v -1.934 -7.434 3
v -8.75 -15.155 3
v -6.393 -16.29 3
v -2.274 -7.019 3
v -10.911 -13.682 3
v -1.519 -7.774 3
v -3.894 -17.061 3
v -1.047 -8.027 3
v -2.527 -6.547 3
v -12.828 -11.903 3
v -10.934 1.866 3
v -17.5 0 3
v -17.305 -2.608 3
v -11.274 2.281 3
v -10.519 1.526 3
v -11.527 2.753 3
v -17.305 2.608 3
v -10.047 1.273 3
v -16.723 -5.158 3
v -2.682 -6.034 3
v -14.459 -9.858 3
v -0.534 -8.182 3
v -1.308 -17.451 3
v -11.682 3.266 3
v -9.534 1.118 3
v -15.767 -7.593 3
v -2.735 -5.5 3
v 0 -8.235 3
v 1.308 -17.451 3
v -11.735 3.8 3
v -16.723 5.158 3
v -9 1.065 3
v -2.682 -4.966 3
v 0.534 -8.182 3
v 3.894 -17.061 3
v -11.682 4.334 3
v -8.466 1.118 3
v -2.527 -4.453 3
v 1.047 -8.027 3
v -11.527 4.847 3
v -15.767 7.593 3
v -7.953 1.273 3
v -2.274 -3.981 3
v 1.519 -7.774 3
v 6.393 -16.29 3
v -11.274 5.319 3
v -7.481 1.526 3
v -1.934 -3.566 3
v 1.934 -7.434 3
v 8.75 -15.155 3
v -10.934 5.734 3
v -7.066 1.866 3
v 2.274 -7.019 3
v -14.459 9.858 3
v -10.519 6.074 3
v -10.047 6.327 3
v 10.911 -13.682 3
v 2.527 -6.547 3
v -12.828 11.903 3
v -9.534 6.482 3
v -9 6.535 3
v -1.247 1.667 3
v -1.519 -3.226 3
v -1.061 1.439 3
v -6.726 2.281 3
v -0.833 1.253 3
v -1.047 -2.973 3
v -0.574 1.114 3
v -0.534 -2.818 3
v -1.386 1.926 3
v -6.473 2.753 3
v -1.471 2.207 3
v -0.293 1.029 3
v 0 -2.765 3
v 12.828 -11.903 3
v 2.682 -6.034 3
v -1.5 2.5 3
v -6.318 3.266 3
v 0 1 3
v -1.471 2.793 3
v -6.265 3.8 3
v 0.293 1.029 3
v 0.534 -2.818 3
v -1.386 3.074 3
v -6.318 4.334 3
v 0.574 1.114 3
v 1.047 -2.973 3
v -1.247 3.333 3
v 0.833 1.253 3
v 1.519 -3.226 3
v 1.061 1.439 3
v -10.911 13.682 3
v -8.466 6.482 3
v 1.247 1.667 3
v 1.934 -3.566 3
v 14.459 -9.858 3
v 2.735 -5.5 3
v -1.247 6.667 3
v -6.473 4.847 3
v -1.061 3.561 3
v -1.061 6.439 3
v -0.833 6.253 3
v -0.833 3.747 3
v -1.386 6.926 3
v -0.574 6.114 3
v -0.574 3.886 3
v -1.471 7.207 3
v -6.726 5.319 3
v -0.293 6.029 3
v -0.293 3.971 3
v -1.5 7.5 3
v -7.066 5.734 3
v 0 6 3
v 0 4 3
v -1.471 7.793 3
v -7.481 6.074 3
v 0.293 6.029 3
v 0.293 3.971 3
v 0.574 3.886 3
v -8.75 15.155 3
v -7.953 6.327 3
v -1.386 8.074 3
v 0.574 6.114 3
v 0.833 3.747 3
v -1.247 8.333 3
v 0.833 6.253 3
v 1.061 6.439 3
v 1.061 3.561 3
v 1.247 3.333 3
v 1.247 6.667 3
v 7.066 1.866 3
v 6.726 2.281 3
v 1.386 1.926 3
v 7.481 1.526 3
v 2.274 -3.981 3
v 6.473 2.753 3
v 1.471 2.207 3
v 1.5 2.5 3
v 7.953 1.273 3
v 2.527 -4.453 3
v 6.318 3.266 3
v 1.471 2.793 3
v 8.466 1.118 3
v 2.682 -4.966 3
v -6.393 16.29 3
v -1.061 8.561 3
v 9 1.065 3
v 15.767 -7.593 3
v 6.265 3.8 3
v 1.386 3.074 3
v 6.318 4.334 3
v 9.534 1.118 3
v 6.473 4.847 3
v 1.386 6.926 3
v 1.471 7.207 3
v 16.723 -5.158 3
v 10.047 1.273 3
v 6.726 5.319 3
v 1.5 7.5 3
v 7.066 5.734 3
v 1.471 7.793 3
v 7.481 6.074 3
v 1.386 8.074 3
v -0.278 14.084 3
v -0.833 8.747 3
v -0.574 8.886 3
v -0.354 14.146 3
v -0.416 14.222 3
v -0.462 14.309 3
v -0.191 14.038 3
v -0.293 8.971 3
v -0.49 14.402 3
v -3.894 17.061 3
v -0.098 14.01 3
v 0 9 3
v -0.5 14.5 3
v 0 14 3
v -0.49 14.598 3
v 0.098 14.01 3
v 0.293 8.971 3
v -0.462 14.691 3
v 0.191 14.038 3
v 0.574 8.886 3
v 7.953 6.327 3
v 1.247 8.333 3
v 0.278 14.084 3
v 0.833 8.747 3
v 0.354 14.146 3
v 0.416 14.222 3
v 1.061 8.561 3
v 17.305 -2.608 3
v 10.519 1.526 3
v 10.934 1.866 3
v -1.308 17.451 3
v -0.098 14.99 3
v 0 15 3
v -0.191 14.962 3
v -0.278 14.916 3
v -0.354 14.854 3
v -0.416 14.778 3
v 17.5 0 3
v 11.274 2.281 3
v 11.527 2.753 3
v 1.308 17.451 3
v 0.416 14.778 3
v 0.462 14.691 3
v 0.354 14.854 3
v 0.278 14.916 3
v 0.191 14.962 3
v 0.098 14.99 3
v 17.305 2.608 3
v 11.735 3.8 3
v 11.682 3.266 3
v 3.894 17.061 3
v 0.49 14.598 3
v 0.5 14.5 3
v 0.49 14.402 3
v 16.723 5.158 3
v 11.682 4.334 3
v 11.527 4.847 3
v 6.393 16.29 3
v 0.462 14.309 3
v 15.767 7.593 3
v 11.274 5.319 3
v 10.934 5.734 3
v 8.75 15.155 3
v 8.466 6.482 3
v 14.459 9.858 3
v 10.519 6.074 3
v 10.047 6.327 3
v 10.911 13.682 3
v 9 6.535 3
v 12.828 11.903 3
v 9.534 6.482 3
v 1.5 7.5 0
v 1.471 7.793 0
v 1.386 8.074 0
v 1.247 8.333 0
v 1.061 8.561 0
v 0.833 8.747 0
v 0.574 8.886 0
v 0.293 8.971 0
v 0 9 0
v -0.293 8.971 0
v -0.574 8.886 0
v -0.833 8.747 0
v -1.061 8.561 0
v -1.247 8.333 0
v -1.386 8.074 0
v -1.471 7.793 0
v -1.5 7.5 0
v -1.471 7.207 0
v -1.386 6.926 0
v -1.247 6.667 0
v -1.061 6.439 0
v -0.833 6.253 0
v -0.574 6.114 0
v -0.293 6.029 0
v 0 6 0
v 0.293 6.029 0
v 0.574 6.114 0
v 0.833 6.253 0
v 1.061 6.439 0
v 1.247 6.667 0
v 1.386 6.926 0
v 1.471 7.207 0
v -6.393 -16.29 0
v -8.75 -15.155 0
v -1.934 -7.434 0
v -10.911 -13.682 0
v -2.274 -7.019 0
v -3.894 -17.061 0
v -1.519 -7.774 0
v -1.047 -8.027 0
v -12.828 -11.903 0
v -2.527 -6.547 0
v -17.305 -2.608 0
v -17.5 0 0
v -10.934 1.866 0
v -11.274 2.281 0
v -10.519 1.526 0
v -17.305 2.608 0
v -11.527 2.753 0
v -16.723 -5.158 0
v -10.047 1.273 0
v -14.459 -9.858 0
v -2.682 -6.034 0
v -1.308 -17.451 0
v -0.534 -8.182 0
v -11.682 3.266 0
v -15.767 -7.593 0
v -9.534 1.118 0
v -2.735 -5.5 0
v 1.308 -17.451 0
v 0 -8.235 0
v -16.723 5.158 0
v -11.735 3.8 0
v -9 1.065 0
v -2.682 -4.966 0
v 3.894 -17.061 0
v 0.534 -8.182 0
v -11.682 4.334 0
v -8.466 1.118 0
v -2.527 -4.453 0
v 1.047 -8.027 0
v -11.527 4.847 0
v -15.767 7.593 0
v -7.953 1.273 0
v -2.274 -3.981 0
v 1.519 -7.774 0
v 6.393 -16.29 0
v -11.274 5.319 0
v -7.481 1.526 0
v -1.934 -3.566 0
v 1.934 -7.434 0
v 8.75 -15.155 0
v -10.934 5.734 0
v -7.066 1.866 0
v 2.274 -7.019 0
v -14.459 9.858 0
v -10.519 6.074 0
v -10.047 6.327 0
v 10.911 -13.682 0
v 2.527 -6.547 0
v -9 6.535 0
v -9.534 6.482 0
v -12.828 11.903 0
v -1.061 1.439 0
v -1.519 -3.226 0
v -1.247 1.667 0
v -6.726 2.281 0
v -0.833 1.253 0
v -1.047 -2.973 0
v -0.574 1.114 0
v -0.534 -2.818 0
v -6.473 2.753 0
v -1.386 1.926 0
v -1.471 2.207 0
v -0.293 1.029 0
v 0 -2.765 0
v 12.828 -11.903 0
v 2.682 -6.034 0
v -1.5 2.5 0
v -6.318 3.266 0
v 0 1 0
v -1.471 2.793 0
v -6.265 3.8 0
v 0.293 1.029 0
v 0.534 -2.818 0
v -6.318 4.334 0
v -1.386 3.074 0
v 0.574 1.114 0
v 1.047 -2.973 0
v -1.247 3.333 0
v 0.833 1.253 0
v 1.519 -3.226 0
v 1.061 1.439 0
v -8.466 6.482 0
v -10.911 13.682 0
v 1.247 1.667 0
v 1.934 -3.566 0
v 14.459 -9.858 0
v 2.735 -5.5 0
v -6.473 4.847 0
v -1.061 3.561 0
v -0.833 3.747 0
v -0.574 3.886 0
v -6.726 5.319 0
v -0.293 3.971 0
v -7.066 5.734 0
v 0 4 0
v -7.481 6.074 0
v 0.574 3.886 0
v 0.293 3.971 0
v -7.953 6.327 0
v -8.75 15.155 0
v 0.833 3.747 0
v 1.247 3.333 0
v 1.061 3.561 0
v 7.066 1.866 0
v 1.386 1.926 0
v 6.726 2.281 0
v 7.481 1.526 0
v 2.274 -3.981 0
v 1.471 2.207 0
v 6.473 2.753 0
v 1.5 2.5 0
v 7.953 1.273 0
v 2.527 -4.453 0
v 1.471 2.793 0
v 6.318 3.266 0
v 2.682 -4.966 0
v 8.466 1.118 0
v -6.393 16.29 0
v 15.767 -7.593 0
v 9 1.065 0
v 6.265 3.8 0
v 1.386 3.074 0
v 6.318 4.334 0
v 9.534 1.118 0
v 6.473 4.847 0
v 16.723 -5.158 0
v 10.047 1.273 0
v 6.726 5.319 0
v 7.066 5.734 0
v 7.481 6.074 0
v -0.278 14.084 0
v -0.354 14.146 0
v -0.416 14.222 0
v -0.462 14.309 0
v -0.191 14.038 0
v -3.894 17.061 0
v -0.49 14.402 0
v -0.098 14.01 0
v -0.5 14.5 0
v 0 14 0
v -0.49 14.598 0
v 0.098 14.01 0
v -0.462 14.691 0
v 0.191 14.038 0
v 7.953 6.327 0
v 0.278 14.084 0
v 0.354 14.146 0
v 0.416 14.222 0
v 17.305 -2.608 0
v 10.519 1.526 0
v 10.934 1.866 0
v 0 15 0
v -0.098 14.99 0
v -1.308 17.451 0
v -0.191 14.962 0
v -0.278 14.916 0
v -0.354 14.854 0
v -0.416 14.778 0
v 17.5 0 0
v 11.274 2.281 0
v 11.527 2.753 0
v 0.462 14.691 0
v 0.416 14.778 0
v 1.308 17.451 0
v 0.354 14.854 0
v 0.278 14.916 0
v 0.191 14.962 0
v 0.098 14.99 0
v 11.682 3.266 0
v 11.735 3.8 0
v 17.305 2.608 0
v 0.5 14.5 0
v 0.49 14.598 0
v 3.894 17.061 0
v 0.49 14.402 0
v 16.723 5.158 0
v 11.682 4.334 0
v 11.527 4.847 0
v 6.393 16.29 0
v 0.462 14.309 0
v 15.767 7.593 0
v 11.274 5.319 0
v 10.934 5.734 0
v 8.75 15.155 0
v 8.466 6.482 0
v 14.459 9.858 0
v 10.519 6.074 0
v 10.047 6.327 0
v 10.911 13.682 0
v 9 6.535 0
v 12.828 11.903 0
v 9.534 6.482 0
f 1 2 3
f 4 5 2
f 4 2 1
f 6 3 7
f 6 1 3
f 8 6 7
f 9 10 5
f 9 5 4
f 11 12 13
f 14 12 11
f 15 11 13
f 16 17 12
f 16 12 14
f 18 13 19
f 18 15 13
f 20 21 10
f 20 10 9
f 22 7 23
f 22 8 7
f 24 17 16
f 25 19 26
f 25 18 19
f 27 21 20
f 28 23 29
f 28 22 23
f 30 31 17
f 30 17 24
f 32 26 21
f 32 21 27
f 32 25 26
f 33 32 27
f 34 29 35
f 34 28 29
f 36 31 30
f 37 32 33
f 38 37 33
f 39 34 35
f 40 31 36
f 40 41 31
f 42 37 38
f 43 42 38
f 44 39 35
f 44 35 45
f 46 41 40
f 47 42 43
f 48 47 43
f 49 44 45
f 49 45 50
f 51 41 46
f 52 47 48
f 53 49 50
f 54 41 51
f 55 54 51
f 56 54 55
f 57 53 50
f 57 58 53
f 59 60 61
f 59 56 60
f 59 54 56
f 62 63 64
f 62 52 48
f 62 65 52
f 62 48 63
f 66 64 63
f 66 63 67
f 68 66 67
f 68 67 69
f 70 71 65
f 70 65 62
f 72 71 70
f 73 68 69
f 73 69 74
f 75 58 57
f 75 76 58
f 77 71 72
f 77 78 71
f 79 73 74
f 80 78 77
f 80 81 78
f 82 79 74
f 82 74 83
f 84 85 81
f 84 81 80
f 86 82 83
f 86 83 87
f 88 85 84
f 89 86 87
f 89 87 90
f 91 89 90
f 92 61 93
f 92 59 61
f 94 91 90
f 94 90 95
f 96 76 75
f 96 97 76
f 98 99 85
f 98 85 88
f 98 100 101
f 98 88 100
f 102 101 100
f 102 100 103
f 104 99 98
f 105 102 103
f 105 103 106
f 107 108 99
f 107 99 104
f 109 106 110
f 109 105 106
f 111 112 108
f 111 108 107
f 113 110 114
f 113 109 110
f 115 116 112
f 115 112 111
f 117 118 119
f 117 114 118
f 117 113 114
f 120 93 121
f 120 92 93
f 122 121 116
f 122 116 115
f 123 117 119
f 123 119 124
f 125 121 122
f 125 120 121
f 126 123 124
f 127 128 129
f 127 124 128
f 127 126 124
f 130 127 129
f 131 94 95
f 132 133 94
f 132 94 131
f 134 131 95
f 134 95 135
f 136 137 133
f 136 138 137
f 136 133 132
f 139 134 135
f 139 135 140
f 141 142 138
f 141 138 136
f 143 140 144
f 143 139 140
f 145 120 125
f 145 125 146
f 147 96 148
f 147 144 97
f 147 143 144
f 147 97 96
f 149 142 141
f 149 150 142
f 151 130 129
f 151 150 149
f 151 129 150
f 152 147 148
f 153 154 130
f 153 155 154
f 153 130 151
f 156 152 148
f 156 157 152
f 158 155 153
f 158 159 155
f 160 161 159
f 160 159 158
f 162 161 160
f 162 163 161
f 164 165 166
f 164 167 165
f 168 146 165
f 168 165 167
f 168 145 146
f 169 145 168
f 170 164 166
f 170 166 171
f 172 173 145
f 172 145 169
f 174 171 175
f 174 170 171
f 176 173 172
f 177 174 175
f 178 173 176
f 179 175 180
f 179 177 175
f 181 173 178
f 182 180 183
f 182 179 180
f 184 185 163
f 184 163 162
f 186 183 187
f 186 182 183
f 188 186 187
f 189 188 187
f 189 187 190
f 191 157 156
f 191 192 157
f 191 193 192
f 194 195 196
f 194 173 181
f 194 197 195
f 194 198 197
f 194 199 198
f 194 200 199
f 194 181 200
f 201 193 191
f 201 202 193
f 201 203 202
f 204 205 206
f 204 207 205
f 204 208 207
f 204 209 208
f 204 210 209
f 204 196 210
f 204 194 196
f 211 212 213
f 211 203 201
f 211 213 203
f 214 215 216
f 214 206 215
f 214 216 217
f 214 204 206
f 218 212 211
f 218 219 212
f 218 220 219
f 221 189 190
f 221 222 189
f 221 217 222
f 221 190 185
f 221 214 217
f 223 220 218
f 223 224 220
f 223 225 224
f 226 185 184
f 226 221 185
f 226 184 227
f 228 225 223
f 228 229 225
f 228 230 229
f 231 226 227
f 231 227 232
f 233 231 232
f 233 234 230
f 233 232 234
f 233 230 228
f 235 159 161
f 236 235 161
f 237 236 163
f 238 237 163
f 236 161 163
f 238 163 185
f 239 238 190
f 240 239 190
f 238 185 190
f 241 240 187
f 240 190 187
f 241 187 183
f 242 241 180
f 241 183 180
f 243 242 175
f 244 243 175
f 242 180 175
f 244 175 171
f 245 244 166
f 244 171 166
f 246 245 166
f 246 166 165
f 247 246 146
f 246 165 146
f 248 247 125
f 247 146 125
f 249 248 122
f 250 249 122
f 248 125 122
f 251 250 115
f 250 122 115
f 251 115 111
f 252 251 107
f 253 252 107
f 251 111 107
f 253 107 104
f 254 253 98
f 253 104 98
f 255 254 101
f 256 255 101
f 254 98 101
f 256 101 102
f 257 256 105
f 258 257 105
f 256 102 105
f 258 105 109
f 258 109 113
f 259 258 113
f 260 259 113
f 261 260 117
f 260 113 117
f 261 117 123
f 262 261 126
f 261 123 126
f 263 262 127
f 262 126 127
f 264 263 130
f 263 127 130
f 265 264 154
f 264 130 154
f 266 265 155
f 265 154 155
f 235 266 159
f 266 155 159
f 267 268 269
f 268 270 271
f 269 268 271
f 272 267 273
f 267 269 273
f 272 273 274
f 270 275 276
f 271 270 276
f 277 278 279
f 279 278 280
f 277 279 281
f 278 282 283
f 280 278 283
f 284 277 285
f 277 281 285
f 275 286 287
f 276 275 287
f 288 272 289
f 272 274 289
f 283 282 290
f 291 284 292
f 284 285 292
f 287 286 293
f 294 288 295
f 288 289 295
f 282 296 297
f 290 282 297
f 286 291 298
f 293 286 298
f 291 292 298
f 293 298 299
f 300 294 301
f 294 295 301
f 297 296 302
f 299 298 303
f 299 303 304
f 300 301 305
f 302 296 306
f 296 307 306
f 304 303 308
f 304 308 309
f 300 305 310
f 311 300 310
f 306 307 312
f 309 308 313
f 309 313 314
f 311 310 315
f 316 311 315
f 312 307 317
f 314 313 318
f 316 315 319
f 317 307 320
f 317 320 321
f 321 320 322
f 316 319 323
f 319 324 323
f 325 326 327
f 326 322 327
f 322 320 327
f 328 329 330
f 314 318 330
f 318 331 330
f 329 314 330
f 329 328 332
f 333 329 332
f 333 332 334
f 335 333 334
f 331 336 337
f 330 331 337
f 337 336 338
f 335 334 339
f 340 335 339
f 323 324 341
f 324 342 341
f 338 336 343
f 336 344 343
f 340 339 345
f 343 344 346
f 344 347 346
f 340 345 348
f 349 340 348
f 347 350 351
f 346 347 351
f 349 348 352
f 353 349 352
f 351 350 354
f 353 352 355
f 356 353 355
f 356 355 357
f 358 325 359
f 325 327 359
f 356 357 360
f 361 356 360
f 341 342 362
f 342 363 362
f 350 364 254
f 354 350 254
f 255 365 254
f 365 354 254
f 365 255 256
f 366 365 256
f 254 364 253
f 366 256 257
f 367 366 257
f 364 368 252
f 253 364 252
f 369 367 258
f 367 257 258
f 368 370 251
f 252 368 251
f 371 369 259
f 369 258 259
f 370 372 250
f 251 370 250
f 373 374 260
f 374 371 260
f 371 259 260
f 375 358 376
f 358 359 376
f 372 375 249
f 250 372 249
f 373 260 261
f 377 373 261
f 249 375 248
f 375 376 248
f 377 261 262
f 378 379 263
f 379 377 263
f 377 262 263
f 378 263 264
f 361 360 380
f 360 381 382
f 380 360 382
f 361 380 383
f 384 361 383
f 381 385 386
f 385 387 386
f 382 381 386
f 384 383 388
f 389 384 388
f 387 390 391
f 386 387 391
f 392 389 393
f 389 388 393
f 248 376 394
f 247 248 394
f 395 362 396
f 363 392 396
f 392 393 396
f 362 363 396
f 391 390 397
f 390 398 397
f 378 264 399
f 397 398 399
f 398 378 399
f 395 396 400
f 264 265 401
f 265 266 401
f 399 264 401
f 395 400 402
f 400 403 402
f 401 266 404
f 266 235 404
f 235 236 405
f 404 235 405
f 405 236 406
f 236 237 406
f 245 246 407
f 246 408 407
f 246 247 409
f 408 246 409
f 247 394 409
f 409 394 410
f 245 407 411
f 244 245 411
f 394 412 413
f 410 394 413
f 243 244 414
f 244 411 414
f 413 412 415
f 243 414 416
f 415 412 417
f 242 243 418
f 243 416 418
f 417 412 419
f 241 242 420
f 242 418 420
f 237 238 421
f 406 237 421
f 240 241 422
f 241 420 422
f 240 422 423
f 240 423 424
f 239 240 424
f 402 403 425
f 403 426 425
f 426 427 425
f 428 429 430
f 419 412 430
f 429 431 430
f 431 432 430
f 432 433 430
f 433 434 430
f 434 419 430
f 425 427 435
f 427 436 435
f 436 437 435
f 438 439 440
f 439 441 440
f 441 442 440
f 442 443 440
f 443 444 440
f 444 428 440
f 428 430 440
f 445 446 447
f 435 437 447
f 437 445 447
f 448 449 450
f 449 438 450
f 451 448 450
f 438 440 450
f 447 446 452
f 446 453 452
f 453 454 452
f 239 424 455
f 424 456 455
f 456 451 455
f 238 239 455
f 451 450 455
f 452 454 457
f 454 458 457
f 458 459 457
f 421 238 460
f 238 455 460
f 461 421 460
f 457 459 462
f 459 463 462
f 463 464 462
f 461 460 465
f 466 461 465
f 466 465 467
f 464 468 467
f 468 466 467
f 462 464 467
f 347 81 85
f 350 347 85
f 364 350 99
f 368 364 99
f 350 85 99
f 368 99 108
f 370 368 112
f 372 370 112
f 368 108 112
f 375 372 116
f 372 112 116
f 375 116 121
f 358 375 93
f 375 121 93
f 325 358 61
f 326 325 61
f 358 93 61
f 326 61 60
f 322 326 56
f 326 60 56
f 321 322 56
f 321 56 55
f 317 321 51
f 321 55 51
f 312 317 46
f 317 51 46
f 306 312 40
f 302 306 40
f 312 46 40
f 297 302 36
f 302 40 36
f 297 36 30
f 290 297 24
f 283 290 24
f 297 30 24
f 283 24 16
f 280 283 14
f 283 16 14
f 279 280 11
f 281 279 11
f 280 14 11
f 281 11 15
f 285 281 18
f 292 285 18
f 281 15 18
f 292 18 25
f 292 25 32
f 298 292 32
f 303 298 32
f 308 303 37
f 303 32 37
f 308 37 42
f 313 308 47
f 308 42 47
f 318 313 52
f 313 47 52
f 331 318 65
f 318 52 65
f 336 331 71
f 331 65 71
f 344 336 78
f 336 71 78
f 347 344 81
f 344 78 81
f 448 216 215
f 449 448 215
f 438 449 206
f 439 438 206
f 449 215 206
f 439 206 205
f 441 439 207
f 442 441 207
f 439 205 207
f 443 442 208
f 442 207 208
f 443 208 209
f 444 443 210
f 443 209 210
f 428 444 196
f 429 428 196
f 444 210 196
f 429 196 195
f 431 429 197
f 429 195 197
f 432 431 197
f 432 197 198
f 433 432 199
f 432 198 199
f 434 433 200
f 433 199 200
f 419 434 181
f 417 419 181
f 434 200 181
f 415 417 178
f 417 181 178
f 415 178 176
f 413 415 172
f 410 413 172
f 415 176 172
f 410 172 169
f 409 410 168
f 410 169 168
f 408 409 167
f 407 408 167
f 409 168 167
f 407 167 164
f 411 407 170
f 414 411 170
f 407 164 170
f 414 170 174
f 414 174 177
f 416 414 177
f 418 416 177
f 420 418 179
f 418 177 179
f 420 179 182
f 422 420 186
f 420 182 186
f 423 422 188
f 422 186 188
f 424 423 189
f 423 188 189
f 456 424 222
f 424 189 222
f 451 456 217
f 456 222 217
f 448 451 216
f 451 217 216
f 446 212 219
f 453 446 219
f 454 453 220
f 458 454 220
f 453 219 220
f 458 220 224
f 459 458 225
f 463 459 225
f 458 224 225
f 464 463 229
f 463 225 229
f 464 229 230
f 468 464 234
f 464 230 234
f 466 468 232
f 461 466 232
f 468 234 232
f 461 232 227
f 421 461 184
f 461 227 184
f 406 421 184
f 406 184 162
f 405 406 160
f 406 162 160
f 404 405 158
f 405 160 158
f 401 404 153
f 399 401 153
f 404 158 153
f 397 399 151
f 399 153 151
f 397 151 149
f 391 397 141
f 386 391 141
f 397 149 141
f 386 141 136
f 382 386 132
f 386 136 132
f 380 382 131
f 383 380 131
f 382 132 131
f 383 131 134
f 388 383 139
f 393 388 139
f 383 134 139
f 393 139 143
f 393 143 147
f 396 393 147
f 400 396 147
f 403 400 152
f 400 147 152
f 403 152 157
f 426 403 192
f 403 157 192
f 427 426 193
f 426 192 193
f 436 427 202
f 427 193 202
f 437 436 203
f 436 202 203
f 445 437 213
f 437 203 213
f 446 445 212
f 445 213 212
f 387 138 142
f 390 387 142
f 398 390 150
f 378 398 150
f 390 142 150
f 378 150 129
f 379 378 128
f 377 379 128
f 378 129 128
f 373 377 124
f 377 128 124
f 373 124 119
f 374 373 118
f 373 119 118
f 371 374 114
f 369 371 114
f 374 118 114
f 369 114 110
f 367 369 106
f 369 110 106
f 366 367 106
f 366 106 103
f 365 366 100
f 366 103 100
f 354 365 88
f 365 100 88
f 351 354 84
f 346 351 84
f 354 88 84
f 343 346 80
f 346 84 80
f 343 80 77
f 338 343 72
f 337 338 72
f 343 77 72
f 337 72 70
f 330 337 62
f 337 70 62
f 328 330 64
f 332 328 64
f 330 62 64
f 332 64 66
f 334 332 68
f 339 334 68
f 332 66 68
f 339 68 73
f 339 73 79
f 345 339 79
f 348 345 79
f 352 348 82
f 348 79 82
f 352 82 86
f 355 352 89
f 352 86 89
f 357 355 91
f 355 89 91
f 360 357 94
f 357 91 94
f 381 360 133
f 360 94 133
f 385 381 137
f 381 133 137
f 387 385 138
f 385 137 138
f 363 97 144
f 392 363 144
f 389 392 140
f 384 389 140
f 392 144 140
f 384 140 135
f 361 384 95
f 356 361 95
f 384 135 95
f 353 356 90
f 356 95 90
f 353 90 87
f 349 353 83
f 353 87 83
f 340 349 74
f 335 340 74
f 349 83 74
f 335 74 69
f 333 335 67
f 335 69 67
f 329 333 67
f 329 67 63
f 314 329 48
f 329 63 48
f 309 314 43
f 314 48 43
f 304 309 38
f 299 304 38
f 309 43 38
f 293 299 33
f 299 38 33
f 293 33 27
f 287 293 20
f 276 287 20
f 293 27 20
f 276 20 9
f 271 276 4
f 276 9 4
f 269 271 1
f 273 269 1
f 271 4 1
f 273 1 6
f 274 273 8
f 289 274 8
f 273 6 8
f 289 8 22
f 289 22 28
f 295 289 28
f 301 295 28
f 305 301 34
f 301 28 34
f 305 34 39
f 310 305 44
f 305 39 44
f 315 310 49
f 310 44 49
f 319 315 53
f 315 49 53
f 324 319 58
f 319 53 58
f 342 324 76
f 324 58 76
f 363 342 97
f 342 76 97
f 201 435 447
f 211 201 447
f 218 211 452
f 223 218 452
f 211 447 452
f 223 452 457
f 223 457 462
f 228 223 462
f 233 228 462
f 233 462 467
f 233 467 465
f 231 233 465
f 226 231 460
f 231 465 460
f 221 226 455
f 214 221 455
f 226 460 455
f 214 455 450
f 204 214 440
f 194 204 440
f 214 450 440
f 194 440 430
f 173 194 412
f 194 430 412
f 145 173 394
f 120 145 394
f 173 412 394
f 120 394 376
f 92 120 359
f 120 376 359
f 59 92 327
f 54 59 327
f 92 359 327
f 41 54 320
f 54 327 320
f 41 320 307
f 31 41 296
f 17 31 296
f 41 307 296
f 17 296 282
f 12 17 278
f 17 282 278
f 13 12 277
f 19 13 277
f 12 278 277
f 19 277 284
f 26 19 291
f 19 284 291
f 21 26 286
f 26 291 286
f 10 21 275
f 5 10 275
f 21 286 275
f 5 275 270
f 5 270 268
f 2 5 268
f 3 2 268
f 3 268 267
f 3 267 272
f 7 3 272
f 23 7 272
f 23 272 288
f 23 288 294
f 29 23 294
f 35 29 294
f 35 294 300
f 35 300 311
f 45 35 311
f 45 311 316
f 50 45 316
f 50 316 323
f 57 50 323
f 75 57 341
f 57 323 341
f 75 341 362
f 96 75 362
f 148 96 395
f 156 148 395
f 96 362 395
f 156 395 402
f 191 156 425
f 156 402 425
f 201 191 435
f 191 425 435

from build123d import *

# Parameters (mm, degrees)
SKETCH1_R           = 17.5
BOSS_EXTRUDE1_DEPTH = 3
SKETCH2_R           = 2.735
SKETCH2_R_2         = 0.5
CUT_EXTRUDE1_DEPTH  = 3
SKETCH3_R           = 1.5
CUT_EXTRUDE2_DEPTH  = 3


with BuildPart() as part:
    # Sketch1 → Boss-Extrude1 (new body)
    with BuildSketch(Plane.XY):
        Circle(SKETCH1_R)
    extrude(amount=BOSS_EXTRUDE1_DEPTH)

    # Sketch2 → Cut-Extrude1 (cut)
    with BuildSketch(Plane.XY.offset(3)):
        with Locations((0, -5.5)):
            Circle(SKETCH2_R)
        with Locations((0, 14.5)):
            Circle(SKETCH2_R_2)
        with Locations((-9, 3.8)):
            Circle(SKETCH2_R)
        with Locations((9, 3.8)):
            Circle(SKETCH2_R)
    extrude(amount=-CUT_EXTRUDE1_DEPTH, mode=Mode.SUBTRACT)

    # Sketch3 → Cut-Extrude2 (cut)
    with BuildSketch(Plane.XY.offset(3)):
        with Locations((0, 7.5)):
            Circle(SKETCH3_R)
        with Locations((0, 2.5)):
            Circle(SKETCH3_R)
    extrude(amount=-CUT_EXTRUDE2_DEPTH, mode=Mode.SUBTRACT)


solid = part.part
